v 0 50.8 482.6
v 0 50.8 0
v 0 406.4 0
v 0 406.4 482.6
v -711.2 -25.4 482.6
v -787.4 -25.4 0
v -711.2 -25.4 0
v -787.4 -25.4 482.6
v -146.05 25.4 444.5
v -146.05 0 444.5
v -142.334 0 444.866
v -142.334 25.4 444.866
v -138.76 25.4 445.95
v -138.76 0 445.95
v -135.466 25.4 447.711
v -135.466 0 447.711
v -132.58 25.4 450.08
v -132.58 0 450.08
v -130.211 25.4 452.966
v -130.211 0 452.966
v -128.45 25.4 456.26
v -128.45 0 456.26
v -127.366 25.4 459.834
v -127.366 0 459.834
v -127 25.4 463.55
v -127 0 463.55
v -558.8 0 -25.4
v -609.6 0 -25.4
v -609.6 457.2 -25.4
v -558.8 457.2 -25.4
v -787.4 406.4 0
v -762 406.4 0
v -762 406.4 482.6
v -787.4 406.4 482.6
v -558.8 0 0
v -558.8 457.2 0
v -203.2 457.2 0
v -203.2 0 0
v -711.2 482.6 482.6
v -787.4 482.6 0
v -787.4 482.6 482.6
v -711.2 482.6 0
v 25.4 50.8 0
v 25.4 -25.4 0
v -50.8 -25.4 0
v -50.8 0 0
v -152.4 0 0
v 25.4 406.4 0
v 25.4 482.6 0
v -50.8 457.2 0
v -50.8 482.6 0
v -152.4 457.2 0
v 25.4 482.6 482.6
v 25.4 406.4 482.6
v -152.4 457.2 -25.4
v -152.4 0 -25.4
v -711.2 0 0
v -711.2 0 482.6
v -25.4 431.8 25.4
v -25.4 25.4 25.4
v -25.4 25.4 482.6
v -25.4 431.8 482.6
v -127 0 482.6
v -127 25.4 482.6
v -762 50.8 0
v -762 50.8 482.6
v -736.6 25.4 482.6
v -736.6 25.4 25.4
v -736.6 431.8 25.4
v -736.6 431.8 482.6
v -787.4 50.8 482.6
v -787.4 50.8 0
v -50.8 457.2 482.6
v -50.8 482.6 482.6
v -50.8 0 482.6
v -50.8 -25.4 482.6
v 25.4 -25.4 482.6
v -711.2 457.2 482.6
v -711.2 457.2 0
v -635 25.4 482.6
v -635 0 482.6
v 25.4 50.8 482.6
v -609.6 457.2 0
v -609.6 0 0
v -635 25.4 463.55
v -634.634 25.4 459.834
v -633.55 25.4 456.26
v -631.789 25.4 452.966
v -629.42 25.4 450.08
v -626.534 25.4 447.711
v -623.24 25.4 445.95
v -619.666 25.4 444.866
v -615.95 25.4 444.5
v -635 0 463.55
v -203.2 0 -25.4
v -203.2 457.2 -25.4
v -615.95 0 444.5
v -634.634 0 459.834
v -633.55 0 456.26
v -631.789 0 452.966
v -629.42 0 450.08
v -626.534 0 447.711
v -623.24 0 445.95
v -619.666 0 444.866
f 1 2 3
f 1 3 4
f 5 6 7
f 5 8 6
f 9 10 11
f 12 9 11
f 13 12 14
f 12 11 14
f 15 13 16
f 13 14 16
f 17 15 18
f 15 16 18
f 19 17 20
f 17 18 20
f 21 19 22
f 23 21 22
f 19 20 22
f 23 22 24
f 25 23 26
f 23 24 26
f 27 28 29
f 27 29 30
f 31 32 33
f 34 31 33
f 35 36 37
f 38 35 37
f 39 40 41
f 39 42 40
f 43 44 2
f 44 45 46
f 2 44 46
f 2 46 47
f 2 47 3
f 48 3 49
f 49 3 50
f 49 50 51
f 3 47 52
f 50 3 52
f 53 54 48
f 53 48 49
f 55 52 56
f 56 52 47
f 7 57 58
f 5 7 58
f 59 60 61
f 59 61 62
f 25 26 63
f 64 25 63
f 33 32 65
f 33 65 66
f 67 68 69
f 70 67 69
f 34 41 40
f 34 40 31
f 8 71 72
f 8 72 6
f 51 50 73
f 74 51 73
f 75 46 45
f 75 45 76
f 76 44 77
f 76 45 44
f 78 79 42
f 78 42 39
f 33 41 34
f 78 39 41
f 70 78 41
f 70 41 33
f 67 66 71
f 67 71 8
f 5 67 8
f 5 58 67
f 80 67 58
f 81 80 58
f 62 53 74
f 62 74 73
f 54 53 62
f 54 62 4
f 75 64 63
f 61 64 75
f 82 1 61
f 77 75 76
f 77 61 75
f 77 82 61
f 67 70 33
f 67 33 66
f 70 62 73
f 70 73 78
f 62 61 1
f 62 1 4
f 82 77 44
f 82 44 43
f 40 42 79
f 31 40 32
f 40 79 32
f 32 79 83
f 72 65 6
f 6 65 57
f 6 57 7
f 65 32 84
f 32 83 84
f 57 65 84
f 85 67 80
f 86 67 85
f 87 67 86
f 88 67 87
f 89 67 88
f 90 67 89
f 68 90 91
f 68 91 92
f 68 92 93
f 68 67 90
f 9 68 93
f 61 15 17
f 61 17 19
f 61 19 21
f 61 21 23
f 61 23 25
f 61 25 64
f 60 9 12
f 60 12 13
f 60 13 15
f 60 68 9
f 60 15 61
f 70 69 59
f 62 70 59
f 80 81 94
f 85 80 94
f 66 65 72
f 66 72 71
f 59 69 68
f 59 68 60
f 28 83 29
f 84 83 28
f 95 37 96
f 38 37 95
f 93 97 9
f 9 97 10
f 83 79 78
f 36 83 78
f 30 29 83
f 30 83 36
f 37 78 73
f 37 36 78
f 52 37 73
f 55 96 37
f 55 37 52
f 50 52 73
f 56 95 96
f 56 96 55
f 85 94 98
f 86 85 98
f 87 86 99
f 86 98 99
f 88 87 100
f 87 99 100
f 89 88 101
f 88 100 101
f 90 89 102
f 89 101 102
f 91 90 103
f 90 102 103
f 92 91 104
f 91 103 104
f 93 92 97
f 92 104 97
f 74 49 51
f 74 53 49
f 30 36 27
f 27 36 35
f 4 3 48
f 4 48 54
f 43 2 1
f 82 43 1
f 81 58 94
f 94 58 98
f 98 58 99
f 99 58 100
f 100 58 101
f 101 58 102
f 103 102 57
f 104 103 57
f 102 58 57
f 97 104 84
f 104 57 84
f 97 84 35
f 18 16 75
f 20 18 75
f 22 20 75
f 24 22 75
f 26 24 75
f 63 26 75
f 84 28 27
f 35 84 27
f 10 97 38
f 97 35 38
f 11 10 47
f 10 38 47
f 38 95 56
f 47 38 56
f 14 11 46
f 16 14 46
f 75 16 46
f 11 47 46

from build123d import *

# Parameters (mm, degrees)
F0_W      = 762
F0_H      = 457.2
F1_DEPTH  = 25.4
F2_W      = 50.8
F2_H      = 457.2
F3_DEPTH  = 25.4
F4_W      = 762
F4_H      = 457.2
F4_W_2    = 711.2
F4_H_2    = 406.4
F5_DEPTH  = 457.2
F6_W      = 50.8
F6_H      = 482.6
F7_DEPTH  = 25.4
F8_W      = 50.8
F8_H      = 482.6
F9_DEPTH  = 25.4
F10_W     = 76.2
F10_H     = 482.6
F11_DEPTH = 25.4
F12_W     = 76.2
F12_H     = 482.6
F13_DEPTH = 25.4
F15_DEPTH = 25.4


with BuildPart() as f1:
    # F0 (on Top) → F1 (new body)
    with BuildSketch(Plane.XY):
        with Locations((-381, 228.6)):
            Rectangle(F0_W, F0_H)
    extrude(amount=F1_DEPTH)

    # F2 (on face) → F3 (join)
    with BuildSketch(Plane(origin=(0, 0, 0), x_dir=(1, 0, 0), z_dir=(0, 0, -1))):
        with Locations((-584.2, -228.6)):
            Rectangle(F2_W, F2_H)
        with Locations((-177.8, -228.6)):
            Rectangle(F2_W, F2_H)
    extrude(amount=F3_DEPTH)

    # F4 (on face) → F5 (join)
    with BuildSketch(Plane.XY.offset(25.4)):
        with Locations((-381, 228.6)):
            Rectangle(F4_W, F4_H)
        with Locations((-381, 228.6)):
            Rectangle(F4_W_2, F4_H_2, mode=Mode.SUBTRACT)
    extrude(amount=F5_DEPTH)

    # F6 (on face) → F7 (join)
    with BuildSketch(Plane(origin=(0, 457.2, 0), x_dir=(-1, 0, 0), z_dir=(0, 1, 0))):
        with Locations((25.4, 241.3)):
            Rectangle(F6_W, F6_H)
        with Locations((736.6, 241.3)):
            Rectangle(F6_W, F6_H)
    extrude(amount=F7_DEPTH)

    # F8 (on face) → F9 (join)
    with BuildSketch(Plane.XZ):
        with Locations((-736.6, 241.3)):
            Rectangle(F8_W, F8_H)
        with Locations((-25.4, 241.3)):
            Rectangle(F8_W, F8_H)
    extrude(amount=F9_DEPTH)

    # F10 (on face) → F11 (join)
    with BuildSketch(Plane.YZ):
        with Locations((12.7, 241.3)):
            Rectangle(F10_W, F10_H)
        with Locations((444.5, 241.3)):
            Rectangle(F10_W, F10_H)
    extrude(amount=F11_DEPTH)

    # F12 (on face) → F13 (join)
    with BuildSketch(Plane(origin=(-762, 0, 0), x_dir=(0, -1, 0), z_dir=(-1, 0, 0))):
        with Locations((-444.5, 241.3)):
            Rectangle(F12_W, F12_H)
        with Locations((-12.7, 241.3)):
            Rectangle(F12_W, F12_H)
    extrude(amount=F13_DEPTH)

    # F14 (on face) → F15 (cut)
    with BuildSketch(Plane.XZ):
        with BuildLine():
            Line((-635, 482.6), (-635, 463.55))
            ThreePointArc((-635, 463.55), (-629.420384, 450.079616), (-615.95, 444.5))
            Line((-615.95, 444.5), (-146.05, 444.5))
            ThreePointArc((-146.05, 444.5), (-132.579616, 450.079616), (-127, 463.55))
            Line((-127, 463.55), (-127, 482.6))
            Line((-127, 482.6), (-635, 482.6))
        make_face()
    extrude(amount=-F15_DEPTH, mode=Mode.SUBTRACT)


solid = f1.part
